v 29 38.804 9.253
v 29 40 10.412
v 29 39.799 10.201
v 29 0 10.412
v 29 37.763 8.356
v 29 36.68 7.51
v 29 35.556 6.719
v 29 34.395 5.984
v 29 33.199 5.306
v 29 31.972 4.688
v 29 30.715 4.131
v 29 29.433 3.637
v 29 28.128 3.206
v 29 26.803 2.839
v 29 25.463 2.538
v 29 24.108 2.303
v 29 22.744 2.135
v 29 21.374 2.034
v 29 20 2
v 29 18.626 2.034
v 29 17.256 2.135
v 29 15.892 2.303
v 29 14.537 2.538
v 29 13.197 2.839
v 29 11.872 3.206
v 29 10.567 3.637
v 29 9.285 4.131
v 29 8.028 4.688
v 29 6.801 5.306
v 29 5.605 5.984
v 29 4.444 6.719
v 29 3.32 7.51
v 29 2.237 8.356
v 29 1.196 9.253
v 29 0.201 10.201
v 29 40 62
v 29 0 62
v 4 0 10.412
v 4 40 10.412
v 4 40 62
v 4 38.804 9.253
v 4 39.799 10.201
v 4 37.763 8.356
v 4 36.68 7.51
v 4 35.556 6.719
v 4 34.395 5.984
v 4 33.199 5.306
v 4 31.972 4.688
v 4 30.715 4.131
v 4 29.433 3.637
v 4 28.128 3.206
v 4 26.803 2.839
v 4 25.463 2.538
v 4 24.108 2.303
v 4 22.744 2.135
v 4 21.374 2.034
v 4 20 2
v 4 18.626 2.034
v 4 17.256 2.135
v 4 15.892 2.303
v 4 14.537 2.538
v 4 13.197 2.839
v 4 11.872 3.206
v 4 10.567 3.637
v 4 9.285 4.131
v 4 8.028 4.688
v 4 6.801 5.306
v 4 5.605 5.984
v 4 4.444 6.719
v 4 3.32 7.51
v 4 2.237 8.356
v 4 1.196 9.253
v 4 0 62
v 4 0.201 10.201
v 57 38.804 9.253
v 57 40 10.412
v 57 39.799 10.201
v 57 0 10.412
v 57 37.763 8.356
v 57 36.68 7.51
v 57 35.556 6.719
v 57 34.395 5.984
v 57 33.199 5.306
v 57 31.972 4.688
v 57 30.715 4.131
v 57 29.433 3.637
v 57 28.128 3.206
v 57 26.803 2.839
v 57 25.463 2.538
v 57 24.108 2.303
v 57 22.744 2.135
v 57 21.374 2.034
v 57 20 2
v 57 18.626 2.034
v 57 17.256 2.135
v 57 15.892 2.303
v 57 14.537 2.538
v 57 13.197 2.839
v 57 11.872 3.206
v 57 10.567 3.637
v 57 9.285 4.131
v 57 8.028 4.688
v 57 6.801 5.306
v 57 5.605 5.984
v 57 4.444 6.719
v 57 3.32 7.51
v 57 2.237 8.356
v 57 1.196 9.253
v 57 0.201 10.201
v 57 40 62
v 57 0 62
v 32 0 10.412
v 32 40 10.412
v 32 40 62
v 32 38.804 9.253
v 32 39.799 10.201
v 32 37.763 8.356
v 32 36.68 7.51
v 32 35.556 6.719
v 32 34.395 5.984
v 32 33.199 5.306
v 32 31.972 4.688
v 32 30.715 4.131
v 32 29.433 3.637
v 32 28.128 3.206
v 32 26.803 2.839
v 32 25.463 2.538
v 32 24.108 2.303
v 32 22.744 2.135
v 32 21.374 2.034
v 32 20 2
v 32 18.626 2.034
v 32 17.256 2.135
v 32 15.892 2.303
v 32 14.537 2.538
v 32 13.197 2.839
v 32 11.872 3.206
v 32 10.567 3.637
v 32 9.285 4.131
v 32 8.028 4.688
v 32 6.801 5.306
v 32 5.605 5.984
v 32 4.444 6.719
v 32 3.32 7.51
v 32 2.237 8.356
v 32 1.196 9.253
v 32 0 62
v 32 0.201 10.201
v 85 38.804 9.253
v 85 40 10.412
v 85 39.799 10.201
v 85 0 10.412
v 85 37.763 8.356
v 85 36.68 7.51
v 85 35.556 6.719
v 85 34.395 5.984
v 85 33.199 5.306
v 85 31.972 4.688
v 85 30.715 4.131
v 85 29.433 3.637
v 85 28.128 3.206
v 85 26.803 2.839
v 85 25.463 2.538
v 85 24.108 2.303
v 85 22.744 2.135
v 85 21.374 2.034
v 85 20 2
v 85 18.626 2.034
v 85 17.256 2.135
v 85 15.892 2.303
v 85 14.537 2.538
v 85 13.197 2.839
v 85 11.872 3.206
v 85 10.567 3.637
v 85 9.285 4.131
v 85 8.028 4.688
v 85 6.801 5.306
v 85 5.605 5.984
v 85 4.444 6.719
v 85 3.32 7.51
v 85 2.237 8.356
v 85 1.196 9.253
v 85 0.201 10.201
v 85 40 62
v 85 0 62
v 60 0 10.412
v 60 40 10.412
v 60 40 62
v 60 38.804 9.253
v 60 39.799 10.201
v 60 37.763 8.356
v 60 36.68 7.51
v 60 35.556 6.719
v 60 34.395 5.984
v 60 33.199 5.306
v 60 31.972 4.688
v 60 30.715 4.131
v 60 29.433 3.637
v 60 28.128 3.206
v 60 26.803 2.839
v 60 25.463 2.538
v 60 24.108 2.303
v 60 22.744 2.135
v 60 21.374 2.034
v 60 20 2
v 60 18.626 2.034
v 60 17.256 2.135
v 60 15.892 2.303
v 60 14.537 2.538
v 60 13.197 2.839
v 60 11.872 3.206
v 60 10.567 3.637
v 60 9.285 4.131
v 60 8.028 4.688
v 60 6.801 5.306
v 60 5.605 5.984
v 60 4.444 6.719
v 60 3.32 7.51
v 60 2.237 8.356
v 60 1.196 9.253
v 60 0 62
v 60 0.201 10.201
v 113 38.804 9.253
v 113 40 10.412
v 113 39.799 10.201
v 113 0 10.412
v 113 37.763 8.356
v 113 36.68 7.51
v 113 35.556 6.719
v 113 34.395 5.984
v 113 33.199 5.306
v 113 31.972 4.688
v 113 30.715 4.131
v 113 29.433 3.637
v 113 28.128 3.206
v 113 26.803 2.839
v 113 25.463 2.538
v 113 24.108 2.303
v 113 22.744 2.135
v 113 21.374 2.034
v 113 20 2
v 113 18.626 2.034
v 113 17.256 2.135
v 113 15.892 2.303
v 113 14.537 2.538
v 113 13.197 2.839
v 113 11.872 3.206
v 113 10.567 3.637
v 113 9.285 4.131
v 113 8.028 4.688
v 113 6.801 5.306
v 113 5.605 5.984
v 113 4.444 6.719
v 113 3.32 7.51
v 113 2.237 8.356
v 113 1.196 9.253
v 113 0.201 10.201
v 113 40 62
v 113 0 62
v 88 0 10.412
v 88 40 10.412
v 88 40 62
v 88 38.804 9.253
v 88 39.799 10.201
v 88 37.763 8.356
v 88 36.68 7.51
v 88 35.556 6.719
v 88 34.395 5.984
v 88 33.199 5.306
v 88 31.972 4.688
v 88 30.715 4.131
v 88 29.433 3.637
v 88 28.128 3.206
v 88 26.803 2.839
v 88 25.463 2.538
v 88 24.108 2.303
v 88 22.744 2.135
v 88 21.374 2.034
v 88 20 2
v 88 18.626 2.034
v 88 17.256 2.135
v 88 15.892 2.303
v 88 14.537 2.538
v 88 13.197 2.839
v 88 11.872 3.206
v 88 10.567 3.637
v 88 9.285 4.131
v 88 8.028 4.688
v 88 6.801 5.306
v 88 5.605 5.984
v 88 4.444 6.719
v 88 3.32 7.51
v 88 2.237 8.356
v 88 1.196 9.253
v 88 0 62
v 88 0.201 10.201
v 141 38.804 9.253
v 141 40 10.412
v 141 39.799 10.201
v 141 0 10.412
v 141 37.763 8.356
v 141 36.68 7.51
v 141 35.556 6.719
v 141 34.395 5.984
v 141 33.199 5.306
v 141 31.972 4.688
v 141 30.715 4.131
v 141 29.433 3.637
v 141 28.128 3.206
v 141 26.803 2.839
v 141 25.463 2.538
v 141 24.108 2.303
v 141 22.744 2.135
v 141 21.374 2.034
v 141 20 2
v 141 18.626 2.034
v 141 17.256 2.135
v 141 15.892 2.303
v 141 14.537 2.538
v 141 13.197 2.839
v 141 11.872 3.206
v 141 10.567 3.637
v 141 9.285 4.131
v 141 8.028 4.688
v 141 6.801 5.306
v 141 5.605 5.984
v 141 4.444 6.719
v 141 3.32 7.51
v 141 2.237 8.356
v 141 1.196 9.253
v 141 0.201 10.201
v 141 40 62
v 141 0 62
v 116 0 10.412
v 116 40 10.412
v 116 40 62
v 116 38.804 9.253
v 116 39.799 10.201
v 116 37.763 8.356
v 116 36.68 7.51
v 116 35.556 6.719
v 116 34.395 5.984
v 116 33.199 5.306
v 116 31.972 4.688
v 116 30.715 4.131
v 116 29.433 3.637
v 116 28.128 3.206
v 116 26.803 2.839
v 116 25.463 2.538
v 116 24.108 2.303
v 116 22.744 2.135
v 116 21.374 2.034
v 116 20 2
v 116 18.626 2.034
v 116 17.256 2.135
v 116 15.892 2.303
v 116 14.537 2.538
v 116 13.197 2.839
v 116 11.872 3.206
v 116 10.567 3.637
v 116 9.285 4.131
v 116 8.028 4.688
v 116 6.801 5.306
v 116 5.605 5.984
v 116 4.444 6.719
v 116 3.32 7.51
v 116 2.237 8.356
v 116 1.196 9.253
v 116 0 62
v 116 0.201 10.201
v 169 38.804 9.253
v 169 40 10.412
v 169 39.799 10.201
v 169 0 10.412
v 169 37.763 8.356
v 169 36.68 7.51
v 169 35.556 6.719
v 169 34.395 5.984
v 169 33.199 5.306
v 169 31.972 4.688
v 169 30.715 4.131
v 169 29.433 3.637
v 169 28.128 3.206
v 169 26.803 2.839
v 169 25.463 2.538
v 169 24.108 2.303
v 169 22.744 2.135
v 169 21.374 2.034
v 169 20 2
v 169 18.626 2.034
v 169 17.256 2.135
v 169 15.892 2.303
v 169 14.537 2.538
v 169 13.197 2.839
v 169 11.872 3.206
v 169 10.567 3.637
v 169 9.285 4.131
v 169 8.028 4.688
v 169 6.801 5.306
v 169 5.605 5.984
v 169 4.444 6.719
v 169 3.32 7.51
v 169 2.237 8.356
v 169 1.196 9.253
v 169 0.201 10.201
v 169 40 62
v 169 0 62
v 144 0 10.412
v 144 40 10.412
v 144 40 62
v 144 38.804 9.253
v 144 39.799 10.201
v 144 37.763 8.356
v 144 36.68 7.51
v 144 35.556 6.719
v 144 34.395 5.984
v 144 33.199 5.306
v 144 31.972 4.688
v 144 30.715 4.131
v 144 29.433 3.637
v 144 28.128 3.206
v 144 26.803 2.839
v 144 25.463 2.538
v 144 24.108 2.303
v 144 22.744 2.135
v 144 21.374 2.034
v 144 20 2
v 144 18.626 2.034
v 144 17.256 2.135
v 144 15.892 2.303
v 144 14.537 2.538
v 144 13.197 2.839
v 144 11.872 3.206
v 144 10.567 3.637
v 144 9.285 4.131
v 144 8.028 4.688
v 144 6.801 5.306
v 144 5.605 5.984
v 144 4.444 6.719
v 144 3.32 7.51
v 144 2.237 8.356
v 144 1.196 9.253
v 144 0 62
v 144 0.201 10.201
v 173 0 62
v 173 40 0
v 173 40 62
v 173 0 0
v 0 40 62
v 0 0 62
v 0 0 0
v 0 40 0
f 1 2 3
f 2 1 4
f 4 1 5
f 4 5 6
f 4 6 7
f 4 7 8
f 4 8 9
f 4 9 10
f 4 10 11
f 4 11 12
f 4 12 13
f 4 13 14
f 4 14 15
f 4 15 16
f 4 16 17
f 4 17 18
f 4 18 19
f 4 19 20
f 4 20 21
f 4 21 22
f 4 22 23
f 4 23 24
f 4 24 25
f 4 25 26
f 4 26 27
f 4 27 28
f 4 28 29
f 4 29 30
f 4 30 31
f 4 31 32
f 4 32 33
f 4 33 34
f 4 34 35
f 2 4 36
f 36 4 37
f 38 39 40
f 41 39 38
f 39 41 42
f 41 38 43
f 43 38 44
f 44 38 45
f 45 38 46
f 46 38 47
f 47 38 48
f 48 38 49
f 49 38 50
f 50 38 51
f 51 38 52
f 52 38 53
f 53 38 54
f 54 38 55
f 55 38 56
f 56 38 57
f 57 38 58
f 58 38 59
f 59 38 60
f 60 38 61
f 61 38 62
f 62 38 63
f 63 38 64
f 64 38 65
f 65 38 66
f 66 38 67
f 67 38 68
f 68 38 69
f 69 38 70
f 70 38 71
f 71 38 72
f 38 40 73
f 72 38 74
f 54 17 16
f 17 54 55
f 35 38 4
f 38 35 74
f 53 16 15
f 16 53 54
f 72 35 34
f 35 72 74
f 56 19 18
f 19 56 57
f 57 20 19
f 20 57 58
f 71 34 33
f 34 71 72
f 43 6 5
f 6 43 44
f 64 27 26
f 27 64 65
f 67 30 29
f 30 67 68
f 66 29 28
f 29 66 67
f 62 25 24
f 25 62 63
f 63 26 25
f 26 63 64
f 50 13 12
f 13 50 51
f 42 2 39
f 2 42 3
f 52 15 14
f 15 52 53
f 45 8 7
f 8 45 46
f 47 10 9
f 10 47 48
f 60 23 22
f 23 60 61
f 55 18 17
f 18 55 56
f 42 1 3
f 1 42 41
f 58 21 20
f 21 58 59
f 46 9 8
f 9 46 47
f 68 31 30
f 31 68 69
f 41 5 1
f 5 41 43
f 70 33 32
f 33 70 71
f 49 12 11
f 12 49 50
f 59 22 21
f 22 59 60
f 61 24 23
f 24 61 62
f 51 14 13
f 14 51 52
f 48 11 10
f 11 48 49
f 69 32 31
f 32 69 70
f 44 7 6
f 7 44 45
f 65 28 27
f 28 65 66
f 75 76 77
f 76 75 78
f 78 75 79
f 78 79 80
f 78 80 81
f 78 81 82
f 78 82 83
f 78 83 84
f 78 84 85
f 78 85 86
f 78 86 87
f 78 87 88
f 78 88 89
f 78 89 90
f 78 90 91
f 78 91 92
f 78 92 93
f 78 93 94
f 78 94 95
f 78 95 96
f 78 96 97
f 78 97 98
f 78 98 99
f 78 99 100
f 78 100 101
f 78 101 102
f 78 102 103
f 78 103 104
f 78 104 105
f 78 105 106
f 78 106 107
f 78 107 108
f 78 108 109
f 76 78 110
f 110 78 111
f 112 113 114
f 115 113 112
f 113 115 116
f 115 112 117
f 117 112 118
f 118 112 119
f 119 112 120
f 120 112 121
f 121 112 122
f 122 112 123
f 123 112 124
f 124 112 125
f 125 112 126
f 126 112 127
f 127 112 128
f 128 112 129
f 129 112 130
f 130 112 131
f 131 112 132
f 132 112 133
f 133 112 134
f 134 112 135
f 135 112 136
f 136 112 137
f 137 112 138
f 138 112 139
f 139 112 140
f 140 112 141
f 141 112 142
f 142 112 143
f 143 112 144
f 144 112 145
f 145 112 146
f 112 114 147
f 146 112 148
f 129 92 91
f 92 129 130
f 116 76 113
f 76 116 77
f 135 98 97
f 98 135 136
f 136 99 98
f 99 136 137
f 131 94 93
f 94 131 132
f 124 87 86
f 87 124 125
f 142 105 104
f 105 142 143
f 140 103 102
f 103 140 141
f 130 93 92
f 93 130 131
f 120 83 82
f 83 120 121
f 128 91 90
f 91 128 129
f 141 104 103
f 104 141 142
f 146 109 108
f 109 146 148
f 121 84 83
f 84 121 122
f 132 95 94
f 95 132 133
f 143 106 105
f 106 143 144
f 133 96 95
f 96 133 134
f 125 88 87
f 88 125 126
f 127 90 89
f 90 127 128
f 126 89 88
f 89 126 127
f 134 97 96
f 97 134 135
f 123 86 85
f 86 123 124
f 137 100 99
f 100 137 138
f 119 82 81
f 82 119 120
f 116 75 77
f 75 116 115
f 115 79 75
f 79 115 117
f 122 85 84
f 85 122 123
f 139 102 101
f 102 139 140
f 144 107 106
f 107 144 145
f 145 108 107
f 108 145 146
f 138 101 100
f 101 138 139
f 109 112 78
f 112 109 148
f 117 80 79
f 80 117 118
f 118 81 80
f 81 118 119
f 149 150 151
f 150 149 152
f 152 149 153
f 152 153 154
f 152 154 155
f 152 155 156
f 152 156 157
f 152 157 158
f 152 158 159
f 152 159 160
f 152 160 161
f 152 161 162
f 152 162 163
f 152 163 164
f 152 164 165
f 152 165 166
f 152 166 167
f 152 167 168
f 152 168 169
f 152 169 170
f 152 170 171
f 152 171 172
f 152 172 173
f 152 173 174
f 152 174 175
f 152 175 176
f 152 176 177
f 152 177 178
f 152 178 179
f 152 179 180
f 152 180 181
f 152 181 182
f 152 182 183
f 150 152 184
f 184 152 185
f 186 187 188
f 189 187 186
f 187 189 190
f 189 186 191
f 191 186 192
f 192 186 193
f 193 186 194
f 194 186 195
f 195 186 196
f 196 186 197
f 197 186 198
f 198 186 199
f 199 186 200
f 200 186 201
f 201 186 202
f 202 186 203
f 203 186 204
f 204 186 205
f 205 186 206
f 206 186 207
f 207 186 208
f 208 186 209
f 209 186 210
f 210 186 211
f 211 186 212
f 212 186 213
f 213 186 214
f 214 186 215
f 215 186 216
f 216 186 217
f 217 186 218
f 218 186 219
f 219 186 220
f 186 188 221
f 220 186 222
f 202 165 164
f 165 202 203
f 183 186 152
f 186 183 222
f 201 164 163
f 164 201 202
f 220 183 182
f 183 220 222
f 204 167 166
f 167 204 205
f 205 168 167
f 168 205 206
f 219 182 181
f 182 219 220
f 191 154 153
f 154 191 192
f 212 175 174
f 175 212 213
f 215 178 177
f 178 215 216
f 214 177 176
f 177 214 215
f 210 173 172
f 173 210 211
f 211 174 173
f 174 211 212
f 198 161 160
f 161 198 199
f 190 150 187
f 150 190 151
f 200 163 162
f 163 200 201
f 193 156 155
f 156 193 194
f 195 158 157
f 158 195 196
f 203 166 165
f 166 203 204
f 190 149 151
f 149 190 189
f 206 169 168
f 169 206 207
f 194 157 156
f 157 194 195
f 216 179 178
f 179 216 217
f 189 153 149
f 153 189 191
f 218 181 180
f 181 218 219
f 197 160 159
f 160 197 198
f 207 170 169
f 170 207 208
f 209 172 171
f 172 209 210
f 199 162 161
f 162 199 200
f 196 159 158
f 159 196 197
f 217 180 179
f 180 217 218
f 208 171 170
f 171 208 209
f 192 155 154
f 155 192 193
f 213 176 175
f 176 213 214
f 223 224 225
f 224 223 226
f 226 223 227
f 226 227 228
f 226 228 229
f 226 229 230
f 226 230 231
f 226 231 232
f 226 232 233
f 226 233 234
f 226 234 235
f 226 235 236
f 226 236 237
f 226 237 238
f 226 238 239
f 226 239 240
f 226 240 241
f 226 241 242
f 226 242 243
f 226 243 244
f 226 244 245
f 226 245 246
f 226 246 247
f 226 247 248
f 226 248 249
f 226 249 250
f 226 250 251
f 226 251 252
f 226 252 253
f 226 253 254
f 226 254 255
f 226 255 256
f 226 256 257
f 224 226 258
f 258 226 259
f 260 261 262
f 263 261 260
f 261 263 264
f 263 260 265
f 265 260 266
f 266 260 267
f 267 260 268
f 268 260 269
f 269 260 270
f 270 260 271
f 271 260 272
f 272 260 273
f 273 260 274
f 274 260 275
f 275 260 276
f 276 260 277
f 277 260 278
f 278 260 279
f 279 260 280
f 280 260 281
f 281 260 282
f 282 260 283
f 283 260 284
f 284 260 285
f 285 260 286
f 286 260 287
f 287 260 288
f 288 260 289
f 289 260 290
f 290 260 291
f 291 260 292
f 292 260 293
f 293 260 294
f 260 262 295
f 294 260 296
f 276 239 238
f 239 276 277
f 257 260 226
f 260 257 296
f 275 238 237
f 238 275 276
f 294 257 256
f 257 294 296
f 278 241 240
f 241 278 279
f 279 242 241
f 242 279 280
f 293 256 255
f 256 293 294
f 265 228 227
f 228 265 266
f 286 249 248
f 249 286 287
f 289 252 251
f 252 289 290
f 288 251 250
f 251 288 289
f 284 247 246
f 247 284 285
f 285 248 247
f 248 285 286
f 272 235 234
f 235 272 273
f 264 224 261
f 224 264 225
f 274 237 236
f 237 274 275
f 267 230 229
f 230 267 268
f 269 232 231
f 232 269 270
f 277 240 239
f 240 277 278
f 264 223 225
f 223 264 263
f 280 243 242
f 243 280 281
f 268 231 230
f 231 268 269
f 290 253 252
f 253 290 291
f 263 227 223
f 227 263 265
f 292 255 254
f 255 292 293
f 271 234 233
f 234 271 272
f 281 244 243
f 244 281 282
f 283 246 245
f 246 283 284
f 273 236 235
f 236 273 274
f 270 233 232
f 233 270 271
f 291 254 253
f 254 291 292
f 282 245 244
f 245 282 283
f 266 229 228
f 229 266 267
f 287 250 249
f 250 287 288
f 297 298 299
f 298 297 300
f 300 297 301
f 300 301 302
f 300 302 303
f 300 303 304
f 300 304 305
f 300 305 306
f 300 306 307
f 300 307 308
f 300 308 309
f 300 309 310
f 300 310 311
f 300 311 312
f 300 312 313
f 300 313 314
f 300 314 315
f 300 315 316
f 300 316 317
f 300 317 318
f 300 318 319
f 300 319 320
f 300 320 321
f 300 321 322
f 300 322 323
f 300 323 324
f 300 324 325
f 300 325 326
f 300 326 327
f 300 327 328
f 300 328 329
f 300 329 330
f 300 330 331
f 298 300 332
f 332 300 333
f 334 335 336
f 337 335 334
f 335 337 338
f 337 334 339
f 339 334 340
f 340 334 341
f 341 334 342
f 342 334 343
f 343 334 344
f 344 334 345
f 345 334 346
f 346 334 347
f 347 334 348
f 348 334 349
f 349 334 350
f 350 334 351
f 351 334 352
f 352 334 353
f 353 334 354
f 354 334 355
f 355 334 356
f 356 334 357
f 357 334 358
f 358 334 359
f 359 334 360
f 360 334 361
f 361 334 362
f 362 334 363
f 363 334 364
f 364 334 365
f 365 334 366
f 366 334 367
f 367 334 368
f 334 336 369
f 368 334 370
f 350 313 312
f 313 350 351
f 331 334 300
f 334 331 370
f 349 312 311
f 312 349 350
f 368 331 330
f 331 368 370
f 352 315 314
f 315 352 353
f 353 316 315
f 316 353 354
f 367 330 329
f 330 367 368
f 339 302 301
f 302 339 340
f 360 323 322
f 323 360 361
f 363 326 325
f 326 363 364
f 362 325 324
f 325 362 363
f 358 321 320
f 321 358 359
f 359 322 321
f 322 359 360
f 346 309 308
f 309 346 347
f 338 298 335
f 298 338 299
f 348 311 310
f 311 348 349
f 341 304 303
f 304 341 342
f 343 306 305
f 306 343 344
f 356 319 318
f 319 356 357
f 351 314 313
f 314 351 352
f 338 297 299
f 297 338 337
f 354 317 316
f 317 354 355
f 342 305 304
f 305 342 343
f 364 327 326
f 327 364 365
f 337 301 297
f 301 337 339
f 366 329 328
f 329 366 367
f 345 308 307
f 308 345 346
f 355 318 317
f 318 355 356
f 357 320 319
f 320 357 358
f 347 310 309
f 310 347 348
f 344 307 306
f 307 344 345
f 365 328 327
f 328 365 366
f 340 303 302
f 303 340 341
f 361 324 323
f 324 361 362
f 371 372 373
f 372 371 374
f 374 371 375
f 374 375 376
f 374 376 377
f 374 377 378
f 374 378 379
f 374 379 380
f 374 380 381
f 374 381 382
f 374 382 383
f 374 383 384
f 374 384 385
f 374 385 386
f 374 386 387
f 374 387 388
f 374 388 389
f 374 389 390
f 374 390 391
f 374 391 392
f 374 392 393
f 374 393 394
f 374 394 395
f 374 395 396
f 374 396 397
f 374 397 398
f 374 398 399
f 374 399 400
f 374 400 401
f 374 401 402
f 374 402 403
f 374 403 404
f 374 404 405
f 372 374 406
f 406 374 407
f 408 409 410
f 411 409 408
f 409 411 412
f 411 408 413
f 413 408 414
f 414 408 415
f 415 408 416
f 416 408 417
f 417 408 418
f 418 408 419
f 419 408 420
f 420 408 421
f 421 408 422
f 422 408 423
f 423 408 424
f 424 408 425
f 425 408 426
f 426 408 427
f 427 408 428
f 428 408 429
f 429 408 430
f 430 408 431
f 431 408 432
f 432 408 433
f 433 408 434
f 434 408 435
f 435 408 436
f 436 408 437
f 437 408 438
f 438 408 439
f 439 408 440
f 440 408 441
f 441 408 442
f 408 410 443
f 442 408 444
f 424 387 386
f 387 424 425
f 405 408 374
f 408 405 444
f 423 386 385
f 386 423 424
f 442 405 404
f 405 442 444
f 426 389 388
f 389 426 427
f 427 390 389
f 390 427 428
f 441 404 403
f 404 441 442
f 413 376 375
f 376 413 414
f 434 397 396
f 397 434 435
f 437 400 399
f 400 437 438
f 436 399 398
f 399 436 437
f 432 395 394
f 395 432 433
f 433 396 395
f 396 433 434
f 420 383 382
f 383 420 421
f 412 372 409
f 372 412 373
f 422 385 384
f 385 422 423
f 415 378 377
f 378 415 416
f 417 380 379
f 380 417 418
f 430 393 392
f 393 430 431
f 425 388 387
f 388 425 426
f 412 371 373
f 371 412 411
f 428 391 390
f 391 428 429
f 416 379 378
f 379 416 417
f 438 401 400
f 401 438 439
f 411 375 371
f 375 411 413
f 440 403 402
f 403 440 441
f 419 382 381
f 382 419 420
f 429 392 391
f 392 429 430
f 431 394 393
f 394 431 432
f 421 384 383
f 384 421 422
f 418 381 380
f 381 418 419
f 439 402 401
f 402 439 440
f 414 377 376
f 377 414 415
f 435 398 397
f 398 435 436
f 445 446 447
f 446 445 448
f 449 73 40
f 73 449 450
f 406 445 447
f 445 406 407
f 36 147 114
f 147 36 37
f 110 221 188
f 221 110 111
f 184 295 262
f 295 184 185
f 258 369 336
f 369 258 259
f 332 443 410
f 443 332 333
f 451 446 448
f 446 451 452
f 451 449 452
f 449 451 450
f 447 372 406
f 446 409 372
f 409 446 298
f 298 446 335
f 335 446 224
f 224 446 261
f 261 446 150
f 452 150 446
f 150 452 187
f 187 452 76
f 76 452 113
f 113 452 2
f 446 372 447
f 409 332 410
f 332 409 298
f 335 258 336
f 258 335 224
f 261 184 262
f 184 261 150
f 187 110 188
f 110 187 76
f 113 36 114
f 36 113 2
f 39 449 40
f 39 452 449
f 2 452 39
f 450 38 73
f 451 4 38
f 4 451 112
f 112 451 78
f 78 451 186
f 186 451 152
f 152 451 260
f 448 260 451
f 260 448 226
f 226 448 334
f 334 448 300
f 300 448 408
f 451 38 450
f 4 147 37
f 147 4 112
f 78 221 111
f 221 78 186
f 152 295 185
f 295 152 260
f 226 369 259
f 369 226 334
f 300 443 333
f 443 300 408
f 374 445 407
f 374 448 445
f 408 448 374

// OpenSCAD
// file: ../../common/utils.scad
// Common utilities and shared variables
// Include this file at the top of your models:
//   include <../../common/utils.scad>

// ── Units ────────────────────────────────────────────────────────────────────
// All dimensions in millimeters

// ── Print tolerances ─────────────────────────────────────────────────────────
// Gap to add when two parts need to fit together (e.g., peg into a hole)
FIT_CLEARANCE = 0.2;  // mm

// Tolerance for press-fit / tight connections
PRESS_FIT = 0.1;  // mm

// ── Quality settings ─────────────────────────────────────────────────────────
// Override per-model if needed
$fn = $preview ? 32 : 128;  // Circle/sphere resolution

// ── Common layer heights ──────────────────────────────────────────────────────
LAYER_HEIGHT      = 0.2;   // standard
FIRST_LAYER       = 0.3;   // slightly thicker first layer
MIN_WALL          = 0.4;   // single extrusion width (0.4 mm nozzle)
// main file
// Yeti-style water bottle lid rack — kitchen cabinet organiser
// Holds wide-mouth lids (Yeti / Hydro Flask style) standing on edge,
// dish-rack style.  Slots are open front AND back; a cylindrical cradle
// groove at the base of each slot keeps the round lid rim from rolling.
//
// Usage:
//   openscad -o yeti-style-lid-rack.stl yeti-style-lid-rack.scad
//   openscad -D "n_lids=4" -o yeti-style-lid-rack-4.stl yeti-style-lid-rack.scad

include <../../common/utils.scad>

// ── Parameters ────────────────────────────────────────────────────────────────

lid_od        = 100;  // lid outer diameter (mm)
slot_gap      = 25;   // clear gap between dividers for each lid (mm)
n_lids        =  6;   // number of lid slots
slot_h        = 50;   // slot wall height above the base (lids protrude above) (mm)
wall          =  4;   // outer side-wall thickness (mm)
divider_t     =  3;   // divider fin thickness (mm)
base_h        = 12;   // floor thickness; must exceed cradle_r (mm)
rack_depth    = 40;   // front-to-back depth of the rack (mm)
cradle_r      = 28;   // large radius gives a visible curved profile at front/back faces (mm)
cradle_depth  = 10;   // groove depth below the slot floor (mm)

// ── Derived ───────────────────────────────────────────────────────────────────

slot_w  = slot_gap;
total_w = 2 * wall + n_lids * slot_w + (n_lids - 1) * divider_t;
total_d = rack_depth;
total_h = base_h + slot_h;
cradle_z = base_h + cradle_r - cradle_depth;

// ── Model ─────────────────────────────────────────────────────────────────────

difference() {
    // Solid block
    cube([total_w, total_d, total_h]);

    for (i = [0 : n_lids - 1]) {
        slot_x = wall + i * (slot_w + divider_t);

        // Open vertical slot — open on both front and back faces
        translate([slot_x, -1, base_h])
            cube([slot_w, total_d + 2, slot_h + 1]);

        // Cradle groove: cylindrical scoop at the floor of each slot.
        // Axis runs along X (slot-width direction); the arc in the Y-Z plane
        // cradles the circular lid rim and prevents it from rolling.
        translate([slot_x, total_d / 2, cradle_z])
            rotate([0, 90, 0])
                cylinder(h = slot_w, r = cradle_r);
    }
}
